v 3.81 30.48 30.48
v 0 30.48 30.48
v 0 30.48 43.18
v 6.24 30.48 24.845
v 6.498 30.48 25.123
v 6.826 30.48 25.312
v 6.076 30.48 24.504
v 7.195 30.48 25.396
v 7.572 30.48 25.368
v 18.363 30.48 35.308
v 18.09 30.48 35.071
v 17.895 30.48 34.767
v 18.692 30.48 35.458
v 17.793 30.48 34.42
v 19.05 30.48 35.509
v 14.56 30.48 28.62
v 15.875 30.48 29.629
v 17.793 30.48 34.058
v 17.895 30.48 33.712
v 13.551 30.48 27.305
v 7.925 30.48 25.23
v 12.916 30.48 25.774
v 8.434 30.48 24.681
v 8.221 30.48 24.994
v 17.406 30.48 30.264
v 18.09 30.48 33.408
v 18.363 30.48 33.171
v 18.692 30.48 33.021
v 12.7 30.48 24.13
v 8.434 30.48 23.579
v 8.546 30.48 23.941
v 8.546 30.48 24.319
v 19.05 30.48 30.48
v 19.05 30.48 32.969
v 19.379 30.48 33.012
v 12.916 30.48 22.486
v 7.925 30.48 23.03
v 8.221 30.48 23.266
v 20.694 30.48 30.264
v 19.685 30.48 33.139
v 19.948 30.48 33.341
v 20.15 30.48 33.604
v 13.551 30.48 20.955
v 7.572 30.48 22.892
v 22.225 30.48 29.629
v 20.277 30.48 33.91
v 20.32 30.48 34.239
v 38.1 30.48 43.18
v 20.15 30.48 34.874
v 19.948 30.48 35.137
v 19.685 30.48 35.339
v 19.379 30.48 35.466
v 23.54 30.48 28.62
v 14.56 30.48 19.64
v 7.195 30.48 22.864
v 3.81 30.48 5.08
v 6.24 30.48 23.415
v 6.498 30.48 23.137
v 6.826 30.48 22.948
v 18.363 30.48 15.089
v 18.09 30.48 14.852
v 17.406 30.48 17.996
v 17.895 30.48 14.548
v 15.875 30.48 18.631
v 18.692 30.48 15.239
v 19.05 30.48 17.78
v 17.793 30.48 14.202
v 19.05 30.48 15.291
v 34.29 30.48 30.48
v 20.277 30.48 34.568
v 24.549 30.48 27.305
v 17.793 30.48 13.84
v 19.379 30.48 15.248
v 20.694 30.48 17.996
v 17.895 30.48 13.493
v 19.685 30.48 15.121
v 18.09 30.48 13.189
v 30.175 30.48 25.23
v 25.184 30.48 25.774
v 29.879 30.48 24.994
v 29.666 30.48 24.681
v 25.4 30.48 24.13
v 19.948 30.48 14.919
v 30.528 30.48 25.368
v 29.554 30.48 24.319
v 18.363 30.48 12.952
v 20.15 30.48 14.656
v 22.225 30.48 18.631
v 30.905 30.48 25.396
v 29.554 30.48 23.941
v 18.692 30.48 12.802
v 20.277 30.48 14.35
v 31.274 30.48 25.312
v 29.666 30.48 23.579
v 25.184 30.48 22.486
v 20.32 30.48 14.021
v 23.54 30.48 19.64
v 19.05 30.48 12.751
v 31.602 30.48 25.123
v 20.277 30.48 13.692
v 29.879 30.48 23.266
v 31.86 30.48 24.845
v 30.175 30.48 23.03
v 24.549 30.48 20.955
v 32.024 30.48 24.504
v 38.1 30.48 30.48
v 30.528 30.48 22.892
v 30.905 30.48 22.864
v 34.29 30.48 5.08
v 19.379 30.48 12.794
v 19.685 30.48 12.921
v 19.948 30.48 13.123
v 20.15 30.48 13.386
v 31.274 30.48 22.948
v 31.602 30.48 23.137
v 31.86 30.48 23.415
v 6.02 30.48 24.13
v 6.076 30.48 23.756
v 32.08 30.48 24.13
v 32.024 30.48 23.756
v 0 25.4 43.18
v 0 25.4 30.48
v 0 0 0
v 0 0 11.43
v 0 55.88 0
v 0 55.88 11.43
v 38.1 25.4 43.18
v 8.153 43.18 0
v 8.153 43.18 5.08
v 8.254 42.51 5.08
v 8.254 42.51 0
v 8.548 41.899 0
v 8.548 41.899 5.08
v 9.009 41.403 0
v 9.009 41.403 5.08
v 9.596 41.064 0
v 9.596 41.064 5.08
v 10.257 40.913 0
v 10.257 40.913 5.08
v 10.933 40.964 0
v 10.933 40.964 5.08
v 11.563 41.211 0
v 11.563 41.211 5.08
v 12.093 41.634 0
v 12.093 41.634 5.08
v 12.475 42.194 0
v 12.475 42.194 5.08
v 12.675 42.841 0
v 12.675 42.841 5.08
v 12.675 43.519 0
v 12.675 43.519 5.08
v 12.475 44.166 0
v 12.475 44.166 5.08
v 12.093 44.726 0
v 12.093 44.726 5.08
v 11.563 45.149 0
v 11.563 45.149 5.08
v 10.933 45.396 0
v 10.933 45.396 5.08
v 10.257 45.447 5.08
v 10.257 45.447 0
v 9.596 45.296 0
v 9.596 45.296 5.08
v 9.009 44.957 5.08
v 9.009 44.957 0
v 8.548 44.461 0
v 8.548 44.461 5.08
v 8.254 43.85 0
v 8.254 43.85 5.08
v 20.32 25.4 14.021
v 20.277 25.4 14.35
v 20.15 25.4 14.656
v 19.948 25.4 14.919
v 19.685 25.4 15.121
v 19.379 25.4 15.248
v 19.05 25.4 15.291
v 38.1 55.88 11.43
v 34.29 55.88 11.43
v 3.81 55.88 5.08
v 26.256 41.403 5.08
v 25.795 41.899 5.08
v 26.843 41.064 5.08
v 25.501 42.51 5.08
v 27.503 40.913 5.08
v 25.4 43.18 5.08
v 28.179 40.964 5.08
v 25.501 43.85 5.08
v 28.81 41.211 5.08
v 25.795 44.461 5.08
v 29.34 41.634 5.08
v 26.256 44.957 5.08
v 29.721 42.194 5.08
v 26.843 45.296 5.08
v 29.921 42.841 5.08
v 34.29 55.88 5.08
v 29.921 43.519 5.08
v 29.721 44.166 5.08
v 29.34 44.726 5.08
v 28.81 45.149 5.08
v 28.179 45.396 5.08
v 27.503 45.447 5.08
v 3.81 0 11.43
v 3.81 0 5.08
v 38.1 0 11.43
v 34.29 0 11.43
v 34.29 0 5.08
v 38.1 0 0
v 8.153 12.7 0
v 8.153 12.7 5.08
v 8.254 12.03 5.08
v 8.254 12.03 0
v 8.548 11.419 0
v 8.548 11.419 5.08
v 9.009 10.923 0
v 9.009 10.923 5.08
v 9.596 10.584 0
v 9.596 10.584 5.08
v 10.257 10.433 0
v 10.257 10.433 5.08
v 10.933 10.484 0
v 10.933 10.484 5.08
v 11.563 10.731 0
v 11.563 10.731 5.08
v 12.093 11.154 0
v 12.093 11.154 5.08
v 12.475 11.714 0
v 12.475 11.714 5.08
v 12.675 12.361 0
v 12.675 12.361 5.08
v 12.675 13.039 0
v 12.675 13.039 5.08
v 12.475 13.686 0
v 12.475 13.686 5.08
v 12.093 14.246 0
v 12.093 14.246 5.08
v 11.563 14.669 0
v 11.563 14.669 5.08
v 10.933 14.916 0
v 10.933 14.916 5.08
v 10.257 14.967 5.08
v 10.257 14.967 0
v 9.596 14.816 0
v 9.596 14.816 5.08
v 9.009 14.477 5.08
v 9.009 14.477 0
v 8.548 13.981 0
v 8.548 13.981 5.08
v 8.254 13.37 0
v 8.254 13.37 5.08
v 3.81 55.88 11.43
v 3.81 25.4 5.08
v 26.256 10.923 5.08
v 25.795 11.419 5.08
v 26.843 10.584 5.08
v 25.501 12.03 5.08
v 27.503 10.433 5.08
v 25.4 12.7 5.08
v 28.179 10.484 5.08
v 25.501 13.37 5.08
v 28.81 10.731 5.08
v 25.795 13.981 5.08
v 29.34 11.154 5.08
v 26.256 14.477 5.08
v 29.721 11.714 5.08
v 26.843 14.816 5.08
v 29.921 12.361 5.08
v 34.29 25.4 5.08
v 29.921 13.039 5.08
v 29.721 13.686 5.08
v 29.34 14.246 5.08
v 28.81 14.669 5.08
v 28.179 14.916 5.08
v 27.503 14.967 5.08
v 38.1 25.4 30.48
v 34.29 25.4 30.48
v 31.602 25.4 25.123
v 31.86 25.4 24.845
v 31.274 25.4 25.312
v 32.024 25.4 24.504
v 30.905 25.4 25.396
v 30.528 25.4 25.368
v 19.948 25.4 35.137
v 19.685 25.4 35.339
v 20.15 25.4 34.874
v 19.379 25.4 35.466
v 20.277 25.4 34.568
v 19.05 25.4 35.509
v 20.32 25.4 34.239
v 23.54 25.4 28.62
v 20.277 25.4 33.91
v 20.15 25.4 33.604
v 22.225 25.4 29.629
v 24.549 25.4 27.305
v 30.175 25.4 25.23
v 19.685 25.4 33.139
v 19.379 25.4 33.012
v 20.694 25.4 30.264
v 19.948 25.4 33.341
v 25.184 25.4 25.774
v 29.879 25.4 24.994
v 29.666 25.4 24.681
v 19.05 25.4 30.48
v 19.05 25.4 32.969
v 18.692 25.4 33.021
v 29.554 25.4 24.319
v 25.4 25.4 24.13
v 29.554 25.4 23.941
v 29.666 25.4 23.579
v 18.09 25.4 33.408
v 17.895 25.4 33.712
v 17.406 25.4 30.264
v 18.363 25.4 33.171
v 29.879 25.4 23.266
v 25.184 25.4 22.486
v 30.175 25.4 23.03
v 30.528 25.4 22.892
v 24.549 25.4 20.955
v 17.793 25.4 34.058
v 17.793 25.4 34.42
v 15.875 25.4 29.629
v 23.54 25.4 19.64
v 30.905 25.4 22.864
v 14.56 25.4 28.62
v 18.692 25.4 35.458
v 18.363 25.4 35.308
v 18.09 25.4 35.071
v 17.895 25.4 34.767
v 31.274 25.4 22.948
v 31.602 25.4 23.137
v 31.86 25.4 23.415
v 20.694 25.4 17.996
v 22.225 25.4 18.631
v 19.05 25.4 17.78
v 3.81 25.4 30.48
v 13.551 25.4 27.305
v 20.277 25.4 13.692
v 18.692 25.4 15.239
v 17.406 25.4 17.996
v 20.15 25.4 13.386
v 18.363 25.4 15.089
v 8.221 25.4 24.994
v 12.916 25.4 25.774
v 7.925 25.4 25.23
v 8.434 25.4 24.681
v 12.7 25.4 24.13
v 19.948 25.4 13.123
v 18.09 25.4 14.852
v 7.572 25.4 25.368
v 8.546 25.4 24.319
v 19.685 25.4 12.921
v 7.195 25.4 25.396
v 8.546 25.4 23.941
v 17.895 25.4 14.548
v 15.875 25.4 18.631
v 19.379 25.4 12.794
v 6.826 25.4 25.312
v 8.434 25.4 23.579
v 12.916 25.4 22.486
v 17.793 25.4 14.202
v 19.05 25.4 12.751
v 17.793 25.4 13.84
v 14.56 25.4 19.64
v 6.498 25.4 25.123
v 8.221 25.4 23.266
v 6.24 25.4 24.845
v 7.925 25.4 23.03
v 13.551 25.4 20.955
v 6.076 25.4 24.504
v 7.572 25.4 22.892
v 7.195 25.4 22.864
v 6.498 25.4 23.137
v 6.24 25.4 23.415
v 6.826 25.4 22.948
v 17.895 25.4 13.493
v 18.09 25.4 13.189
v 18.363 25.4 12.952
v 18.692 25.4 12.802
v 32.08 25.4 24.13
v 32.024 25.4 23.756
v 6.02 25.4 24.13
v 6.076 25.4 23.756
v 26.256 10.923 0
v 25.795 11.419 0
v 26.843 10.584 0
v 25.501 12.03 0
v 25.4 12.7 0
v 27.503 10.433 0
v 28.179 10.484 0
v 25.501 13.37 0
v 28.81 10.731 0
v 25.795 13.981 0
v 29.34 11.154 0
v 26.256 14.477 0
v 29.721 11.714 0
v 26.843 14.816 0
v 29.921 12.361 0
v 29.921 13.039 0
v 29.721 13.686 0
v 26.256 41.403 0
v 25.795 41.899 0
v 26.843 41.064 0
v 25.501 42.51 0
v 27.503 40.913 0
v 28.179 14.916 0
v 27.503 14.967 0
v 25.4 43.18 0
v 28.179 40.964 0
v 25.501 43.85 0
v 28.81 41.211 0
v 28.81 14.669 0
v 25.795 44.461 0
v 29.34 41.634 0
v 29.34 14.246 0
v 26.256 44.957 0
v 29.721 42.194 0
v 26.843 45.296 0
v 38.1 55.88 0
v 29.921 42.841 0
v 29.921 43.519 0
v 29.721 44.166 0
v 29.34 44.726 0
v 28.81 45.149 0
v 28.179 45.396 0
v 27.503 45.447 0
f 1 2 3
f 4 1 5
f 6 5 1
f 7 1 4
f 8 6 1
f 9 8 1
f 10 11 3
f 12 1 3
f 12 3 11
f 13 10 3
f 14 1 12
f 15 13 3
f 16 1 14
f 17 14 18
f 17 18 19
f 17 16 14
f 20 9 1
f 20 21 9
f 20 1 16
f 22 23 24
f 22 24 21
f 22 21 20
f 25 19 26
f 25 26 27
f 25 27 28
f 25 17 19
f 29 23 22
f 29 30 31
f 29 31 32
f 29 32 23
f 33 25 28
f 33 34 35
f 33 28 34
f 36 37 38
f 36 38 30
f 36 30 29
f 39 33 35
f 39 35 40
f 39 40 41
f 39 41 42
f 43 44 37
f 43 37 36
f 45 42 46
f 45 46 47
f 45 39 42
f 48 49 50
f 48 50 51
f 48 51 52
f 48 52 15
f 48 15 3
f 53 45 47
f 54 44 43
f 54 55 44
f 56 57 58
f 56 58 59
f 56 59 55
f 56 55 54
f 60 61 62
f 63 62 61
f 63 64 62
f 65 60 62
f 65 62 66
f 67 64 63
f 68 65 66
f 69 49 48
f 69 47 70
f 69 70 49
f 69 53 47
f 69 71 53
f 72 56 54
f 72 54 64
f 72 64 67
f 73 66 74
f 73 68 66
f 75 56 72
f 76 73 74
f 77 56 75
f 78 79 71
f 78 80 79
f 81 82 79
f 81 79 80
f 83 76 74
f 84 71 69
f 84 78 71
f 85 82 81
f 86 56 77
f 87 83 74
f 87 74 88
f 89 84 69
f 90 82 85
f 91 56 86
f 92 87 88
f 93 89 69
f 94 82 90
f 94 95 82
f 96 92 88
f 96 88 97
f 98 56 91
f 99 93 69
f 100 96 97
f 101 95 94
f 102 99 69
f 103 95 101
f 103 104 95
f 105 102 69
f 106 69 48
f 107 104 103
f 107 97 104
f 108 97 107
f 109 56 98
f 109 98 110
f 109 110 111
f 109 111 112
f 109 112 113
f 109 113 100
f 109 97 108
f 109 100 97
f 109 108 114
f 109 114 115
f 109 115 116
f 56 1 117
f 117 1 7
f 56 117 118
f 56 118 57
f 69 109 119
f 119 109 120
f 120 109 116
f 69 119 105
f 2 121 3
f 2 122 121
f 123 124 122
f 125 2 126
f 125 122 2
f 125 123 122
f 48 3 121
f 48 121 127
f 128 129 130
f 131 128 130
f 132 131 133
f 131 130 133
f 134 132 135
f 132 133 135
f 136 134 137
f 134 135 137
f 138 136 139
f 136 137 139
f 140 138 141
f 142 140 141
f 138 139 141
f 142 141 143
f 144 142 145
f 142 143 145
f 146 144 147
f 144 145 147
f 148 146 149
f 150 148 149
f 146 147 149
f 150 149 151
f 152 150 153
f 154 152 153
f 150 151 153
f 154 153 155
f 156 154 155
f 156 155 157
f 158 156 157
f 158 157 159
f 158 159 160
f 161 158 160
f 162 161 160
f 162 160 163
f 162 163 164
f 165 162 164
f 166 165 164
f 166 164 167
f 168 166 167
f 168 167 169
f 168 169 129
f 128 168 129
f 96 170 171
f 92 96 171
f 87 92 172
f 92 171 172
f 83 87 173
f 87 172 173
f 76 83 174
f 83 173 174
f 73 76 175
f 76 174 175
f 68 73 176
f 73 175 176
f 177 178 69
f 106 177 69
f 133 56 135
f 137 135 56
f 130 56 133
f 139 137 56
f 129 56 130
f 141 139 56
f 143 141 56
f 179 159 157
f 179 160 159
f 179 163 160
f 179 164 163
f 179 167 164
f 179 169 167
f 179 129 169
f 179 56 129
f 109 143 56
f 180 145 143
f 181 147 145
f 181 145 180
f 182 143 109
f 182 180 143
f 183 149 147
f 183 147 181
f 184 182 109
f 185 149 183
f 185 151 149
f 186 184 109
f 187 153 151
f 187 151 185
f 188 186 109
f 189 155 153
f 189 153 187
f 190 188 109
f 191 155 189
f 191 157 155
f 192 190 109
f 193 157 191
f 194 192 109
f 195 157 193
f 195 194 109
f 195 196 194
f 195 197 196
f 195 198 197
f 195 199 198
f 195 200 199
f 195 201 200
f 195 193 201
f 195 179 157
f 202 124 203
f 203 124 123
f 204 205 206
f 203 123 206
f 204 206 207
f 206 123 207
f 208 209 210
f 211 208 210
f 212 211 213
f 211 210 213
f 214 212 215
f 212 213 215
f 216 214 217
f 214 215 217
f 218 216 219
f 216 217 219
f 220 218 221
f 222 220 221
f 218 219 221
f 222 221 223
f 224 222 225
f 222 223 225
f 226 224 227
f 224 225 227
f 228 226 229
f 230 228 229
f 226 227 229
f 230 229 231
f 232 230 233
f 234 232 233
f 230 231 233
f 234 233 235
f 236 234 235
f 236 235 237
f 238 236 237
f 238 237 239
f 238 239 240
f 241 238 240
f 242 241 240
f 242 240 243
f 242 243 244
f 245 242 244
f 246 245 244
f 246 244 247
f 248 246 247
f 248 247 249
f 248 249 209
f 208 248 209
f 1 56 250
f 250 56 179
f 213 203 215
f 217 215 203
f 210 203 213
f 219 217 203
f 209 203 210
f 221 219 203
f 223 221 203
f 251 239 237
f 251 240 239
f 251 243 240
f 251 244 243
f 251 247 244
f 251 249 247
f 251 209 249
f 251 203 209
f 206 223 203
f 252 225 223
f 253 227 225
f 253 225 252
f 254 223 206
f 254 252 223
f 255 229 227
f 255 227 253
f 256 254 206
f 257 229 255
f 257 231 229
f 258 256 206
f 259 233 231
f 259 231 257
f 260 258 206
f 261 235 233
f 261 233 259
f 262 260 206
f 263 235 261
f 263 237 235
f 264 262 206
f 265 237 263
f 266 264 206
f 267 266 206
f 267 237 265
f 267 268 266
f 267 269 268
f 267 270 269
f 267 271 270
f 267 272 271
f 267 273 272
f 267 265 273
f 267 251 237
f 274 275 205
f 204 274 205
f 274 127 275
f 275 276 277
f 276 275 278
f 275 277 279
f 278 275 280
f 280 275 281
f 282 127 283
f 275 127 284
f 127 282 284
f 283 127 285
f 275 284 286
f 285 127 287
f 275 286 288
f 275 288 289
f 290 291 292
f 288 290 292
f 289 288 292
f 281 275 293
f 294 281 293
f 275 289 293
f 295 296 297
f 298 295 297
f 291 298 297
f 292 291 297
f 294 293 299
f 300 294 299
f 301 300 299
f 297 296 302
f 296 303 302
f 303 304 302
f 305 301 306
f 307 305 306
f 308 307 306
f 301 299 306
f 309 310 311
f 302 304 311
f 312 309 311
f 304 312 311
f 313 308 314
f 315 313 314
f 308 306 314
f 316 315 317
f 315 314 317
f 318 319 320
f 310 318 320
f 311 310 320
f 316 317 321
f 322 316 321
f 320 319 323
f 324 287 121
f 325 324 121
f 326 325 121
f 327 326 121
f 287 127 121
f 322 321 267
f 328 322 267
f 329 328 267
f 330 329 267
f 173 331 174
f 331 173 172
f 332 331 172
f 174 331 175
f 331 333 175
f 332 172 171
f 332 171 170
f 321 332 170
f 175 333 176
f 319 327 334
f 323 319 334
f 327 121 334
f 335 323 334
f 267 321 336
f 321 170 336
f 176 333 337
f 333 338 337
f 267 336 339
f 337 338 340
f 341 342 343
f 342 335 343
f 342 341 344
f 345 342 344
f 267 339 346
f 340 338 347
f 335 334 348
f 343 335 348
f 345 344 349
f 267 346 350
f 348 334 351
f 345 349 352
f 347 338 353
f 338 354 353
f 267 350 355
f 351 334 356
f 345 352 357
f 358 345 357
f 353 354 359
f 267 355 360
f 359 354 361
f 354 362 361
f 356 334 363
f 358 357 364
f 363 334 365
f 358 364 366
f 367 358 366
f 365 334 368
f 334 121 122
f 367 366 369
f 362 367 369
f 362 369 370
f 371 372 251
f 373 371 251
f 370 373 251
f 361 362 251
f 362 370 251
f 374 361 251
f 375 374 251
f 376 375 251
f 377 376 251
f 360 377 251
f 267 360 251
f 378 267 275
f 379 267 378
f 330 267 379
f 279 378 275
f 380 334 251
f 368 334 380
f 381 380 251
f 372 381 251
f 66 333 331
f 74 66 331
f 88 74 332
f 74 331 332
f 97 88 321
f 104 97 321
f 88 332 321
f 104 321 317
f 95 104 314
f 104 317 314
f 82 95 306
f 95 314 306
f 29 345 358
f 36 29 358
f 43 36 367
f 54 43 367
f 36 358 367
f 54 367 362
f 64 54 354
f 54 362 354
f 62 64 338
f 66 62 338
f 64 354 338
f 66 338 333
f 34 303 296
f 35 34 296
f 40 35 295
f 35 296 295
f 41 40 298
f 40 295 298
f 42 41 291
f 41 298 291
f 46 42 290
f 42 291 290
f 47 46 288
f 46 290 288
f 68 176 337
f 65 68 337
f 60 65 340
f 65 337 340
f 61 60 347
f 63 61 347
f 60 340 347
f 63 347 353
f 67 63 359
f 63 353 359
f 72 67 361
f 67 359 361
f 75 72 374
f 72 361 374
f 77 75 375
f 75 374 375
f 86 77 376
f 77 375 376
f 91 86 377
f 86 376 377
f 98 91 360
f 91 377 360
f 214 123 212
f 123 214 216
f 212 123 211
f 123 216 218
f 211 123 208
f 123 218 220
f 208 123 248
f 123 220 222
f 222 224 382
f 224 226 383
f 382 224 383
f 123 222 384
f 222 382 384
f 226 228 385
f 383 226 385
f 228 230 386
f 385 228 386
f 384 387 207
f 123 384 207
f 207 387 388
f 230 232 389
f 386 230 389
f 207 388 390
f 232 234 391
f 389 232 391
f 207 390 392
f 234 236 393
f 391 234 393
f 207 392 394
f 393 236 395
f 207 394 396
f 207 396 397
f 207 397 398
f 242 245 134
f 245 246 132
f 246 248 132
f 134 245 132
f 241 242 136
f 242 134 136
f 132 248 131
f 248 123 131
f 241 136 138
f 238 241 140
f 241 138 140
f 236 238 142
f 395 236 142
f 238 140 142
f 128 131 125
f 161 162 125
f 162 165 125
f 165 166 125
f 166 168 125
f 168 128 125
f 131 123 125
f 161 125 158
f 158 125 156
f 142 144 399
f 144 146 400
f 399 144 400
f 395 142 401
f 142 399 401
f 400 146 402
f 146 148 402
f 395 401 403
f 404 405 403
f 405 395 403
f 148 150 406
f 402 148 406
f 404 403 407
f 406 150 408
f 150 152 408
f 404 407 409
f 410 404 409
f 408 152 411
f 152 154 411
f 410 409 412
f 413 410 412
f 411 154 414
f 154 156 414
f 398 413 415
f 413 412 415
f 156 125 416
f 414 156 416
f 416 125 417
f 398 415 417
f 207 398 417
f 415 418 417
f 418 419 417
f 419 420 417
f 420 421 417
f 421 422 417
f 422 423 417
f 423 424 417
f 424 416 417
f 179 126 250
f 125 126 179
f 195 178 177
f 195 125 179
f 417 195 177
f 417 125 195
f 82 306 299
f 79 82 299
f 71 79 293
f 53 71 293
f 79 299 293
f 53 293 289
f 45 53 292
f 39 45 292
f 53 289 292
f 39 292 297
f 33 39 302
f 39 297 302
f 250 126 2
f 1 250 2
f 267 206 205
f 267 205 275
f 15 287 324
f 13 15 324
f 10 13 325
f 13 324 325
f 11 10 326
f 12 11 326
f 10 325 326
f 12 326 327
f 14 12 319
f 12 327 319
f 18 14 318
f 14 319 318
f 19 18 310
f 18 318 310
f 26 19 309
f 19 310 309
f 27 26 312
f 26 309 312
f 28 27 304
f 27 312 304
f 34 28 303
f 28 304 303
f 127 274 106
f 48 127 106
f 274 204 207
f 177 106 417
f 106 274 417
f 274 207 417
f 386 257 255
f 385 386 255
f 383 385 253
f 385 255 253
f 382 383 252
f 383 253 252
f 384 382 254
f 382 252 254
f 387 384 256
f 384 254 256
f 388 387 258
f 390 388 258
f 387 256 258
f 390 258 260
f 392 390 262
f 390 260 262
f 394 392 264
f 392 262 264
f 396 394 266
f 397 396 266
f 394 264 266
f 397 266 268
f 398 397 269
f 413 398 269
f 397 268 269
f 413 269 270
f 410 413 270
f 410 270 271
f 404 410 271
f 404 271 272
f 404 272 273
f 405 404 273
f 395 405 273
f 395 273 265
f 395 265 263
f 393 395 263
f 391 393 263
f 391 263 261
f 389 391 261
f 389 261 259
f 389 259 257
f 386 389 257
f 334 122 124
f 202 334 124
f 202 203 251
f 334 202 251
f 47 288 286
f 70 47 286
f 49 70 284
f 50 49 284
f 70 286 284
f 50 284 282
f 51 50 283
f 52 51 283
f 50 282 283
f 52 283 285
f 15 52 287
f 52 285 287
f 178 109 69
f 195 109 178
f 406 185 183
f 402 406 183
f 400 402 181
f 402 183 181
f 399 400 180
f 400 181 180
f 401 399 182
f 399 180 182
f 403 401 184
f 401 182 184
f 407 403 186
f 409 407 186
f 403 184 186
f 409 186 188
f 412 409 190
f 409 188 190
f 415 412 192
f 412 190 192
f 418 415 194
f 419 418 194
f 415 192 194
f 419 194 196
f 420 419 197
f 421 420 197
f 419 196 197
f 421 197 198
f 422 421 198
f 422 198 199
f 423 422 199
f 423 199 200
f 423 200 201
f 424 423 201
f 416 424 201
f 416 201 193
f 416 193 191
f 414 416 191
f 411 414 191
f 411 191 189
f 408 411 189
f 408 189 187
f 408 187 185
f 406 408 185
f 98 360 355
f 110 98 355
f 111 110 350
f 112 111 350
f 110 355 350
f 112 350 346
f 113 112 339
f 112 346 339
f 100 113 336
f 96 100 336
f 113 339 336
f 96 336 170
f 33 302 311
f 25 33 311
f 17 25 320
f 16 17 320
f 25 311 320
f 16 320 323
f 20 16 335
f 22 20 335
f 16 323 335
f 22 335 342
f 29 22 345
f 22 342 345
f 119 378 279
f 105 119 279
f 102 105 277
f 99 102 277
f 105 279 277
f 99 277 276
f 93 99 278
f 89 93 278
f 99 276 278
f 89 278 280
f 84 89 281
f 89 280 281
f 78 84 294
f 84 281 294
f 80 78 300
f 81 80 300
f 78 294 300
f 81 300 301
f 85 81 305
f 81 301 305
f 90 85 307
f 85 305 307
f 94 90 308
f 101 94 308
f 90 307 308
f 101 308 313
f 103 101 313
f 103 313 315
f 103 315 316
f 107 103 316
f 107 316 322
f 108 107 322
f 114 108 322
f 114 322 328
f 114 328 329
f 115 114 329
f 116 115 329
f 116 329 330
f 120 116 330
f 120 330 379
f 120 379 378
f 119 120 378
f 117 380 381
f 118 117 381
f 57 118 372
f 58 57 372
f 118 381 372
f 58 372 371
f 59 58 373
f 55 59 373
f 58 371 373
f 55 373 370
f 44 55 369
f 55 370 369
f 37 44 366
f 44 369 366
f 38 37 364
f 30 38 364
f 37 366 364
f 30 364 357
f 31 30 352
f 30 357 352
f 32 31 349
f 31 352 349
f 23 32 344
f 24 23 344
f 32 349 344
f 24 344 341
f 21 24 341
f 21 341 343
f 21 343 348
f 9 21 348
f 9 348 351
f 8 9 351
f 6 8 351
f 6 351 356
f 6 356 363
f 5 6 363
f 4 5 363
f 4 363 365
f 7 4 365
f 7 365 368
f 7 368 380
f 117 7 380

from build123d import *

# Parameters (mm, degrees)
F0_W      = 38.1
F0_H      = 55.88
F1_DEPTH  = 5.08
F2_W      = 38.1
F2_H      = 2.54
F3_DEPTH  = 38.1
F5_W      = 3.81
F5_H      = 25.4
F6_DEPTH  = 38.1
F7_W      = 3.81
F7_H      = 25.4
F8_DEPTH  = 38.1
F10_DEPTH = 127
F11_DEPTH = 25.4
F12_DEPTH = 25.4
F14_DEPTH = 25.4
F16_DEPTH = 25.4


with BuildPart() as f1:
    # F0 (on Top) → F1 (new body)
    with BuildSketch(Plane.XY):
        with Locations((19.05, 27.94)):
            Rectangle(F0_W, F0_H)
    extrude(amount=F1_DEPTH)

    # F2 (on face) → F3 (join)
    with BuildSketch(Plane.XY.offset(5.08)):
        with Locations((19.05, 29.21)):
            Rectangle(F2_W, F2_H)
        with Locations((19.05, 26.67)):
            Rectangle(F2_W, F2_H)
    extrude(amount=F3_DEPTH)

    # F5 (on face) → F6 (join)
    with BuildSketch(Plane.XY.offset(5.08)):
        with Locations((1.905, 12.7)):
            Rectangle(F5_W, F5_H)
        with Locations((36.195, 12.7)):
            Rectangle(F5_W, F5_H)
    extrude(amount=F6_DEPTH)

    # F7 (on face) → F8 (join)
    with BuildSketch(Plane.XY.offset(5.08)):
        with Locations((36.195, 43.18)):
            Rectangle(F7_W, F7_H)
        with Locations((1.905, 43.18)):
            Rectangle(F7_W, F7_H)
    extrude(amount=F8_DEPTH)

    # F9 (on face) → F10 (cut)
    with BuildSketch(Plane(origin=(0, 0, 0), x_dir=(0, -1, 0), z_dir=(-1, 0, 0))):
        Polygon((-55.88, 43.18), (-55.88, 11.43), (-30.48, 30.48), (-30.48, 43.18), align=None)
        Polygon((0, 43.18), (-25.4, 43.18), (-25.4, 30.48), (0, 11.43), align=None)
    extrude(amount=-F10_DEPTH, mode=Mode.SUBTRACT)

    # F4 (on face) → F11 (cut)
    with BuildSketch(Plane.XZ.offset(-25.4)):
        with BuildLine():
            ThreePointArc((19.05, 15.2908), (17.78, 14.0208), (19.05, 12.7508))
            Line((19.05, 12.7508), (19.05, 15.2908))
        make_face()
        with BuildLine():
            Line((19.05, 15.2908), (19.05, 12.7508))
            ThreePointArc((19.05, 12.7508), (19.9480256121, 13.1227743879), (20.32, 14.0208))
            ThreePointArc((20.32, 14.0208), (19.9480256121, 14.9188256121), (19.05, 15.2908))
        make_face()
        with BuildLine():
            ThreePointArc((29.5402, 24.13), (30.8102, 22.86), (32.0802, 24.13))
            Line((32.0802, 24.13), (29.5402, 24.13))
        make_face()
        with BuildLine():
            Line((29.5402, 24.13), (32.0802, 24.13))
            ThreePointArc((32.0802, 24.13), (30.8102, 25.4), (29.5402, 24.13))
        make_face()
        with BuildLine():
            ThreePointArc((20.32, 34.2392), (19.9480256121, 35.1372256121), (19.05, 35.5092))
            Line((19.05, 35.5092), (19.05, 32.9692))
            ThreePointArc((19.05, 32.9692), (19.9480256121, 33.3411743879), (20.32, 34.2392))
        make_face()
        with BuildLine():
            Line((19.05, 32.9692), (19.05, 35.5092))
            ThreePointArc((19.05, 35.5092), (17.78, 34.2392), (19.05, 32.9692))
        make_face()
        with BuildLine():
            ThreePointArc((8.5598, 24.13), (7.2898, 25.4), (6.0198, 24.13))
            Line((6.0198, 24.13), (8.5598, 24.13))
        make_face()
        with BuildLine():
            Line((8.5598, 24.13), (6.0198, 24.13))
            ThreePointArc((6.0198, 24.13), (7.2898, 22.86), (8.5598, 24.13))
        make_face()
    extrude(amount=-F11_DEPTH, mode=Mode.SUBTRACT)

    # F4 (on face) → F12 (cut)
    with BuildSketch(Plane.XZ.offset(-25.4)):
        with BuildLine():
            Line((19.05, 26.162), (19.05, 30.48))
            ThreePointArc((19.05, 30.48), (14.5598719395, 28.6201280605), (12.7, 24.13))
            Line((12.7, 24.13), (17.018, 24.13))
            ThreePointArc((17.018, 24.13), (17.6131590206, 25.5668409794), (19.05, 26.162))
        make_face()
        with BuildLine():
            ThreePointArc((25.4, 24.13), (23.5401280605, 28.6201280605), (19.05, 30.48))
            Line((19.05, 30.48), (19.05, 26.162))
            ThreePointArc((19.05, 26.162), (20.4868409794, 25.5668409794), (21.082, 24.13))
            Line((21.082, 24.13), (25.4, 24.13))
        make_face()
        with BuildLine():
            ThreePointArc((21.082, 24.13), (20.4868409794, 25.5668409794), (19.05, 26.162))
            Line((19.05, 26.162), (19.05, 24.13))
            Line((19.05, 24.13), (21.082, 24.13))
        make_face()
        with BuildLine():
            Line((19.05, 24.13), (19.05, 26.162))
            ThreePointArc((19.05, 26.162), (17.6131590206, 25.5668409794), (17.018, 24.13))
            Line((17.018, 24.13), (19.05, 24.13))
        make_face()
        with BuildLine():
            Line((17.018, 24.13), (12.7, 24.13))
            ThreePointArc((12.7, 24.13), (14.5598719395, 19.6398719395), (19.05, 17.78))
            Line((19.05, 17.78), (19.05, 22.098))
            ThreePointArc((19.05, 22.098), (17.6131590206, 22.6931590206), (17.018, 24.13))
        make_face()
        with BuildLine():
            Line((19.05, 24.13), (17.018, 24.13))
            ThreePointArc((17.018, 24.13), (17.6131590206, 22.6931590206), (19.05, 22.098))
            Line((19.05, 22.098), (19.05, 24.13))
        make_face()
        with BuildLine():
            Line((21.082, 24.13), (19.05, 24.13))
            Line((19.05, 24.13), (19.05, 22.098))
            ThreePointArc((19.05, 22.098), (20.4868409794, 22.6931590206), (21.082, 24.13))
        make_face()
        with BuildLine():
            ThreePointArc((19.05, 17.78), (23.5401280605, 19.6398719395), (25.4, 24.13))
            Line((25.4, 24.13), (21.082, 24.13))
            ThreePointArc((21.082, 24.13), (20.4868409794, 22.6931590206), (19.05, 22.098))
            Line((19.05, 22.098), (19.05, 17.78))
        make_face()
    extrude(amount=-F12_DEPTH, mode=Mode.SUBTRACT)

    # F13 (on face) → F14 (cut)
    with BuildSketch(Plane.XY.offset(5.08)):
        with BuildLine():
            ThreePointArc((12.7, 12.7), (10.4267, 14.9733), (8.1534, 12.7))
            Line((8.1534, 12.7), (12.7, 12.7))
        make_face()
        with BuildLine():
            Line((12.7, 12.7), (8.1534, 12.7))
            ThreePointArc((8.1534, 12.7), (10.4267, 10.4267), (12.7, 12.7))
        make_face()
        with BuildLine():
            ThreePointArc((29.9466, 12.7), (27.6733, 14.9733), (25.4, 12.7))
            Line((25.4, 12.7), (29.9466, 12.7))
        make_face()
        with BuildLine():
            Line((29.9466, 12.7), (25.4, 12.7))
            ThreePointArc((25.4, 12.7), (27.6733, 10.4267), (29.9466, 12.7))
        make_face()
    extrude(amount=-F14_DEPTH, mode=Mode.SUBTRACT)

    # F15 (on face) → F16 (cut)
    with BuildSketch(Plane.XY.offset(5.08)):
        with BuildLine():
            ThreePointArc((12.7, 43.18), (10.4267, 45.4533), (8.1534, 43.18))
            Line((8.1534, 43.18), (12.7, 43.18))
        make_face()
        with BuildLine():
            Line((12.7, 43.18), (8.1534, 43.18))
            ThreePointArc((8.1534, 43.18), (10.4267, 40.9067), (12.7, 43.18))
        make_face()
        with BuildLine():
            ThreePointArc((29.9466, 43.18), (27.6733, 45.4533), (25.4, 43.18))
            Line((25.4, 43.18), (29.9466, 43.18))
        make_face()
        with BuildLine():
            Line((29.9466, 43.18), (25.4, 43.18))
            ThreePointArc((25.4, 43.18), (27.6733, 40.9067), (29.9466, 43.18))
        make_face()
    extrude(amount=-F16_DEPTH, mode=Mode.SUBTRACT)


solid = f1.part
